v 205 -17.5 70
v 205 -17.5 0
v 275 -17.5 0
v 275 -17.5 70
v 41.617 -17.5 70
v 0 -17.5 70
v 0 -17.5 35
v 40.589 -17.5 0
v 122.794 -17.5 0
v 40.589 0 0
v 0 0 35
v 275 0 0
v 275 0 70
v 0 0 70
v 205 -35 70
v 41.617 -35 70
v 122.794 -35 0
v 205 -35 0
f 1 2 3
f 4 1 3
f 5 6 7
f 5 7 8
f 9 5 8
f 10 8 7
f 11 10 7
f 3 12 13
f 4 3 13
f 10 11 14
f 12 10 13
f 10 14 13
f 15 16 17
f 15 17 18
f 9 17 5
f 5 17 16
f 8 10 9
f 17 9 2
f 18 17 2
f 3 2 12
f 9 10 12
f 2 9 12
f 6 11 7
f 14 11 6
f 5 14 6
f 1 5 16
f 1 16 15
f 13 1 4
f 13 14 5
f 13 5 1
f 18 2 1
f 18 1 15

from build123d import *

# Parameters (mm, degrees)
F0_W     = 275
F0_H     = 70
F1_DEPTH = 35
F2_W     = 70
F2_H     = 17.5
F3_DEPTH = 70.001
F5_DEPTH = 35.001
F7_DEPTH = 17.5


with BuildPart() as f1:
    # F0 (on Front) → F1 (new body)
    with BuildSketch(Plane.XZ):
        with Locations((137.5, 35)):
            Rectangle(F0_W, F0_H)
    extrude(amount=F1_DEPTH)

    # F2 (on face) → F3 (cut, through all)
    with BuildSketch(Plane(origin=(0, 0, 0), x_dir=(1, 0, 0), z_dir=(0, 0, -1))):
        with Locations((240, 26.25)):
            Rectangle(F2_W, F2_H)
    extrude(amount=-F3_DEPTH, mode=Mode.SUBTRACT)

    # F4 (on face) → F5 (cut, through all)
    with BuildSketch(Plane.XZ.offset(35)):
        Polygon((40.58855, 0), (0, 35), (0, 0), align=None)
    extrude(amount=-F5_DEPTH, mode=Mode.SUBTRACT)

    # F6 (on face) → F7 (cut)
    with BuildSketch(Plane.XZ.offset(35)):
        Polygon((40.58855, 0), (122.794275, 0), (41.617175, 70), (0, 70), (0, 35), align=None)
    extrude(amount=-F7_DEPTH, mode=Mode.SUBTRACT)


solid = f1.part
